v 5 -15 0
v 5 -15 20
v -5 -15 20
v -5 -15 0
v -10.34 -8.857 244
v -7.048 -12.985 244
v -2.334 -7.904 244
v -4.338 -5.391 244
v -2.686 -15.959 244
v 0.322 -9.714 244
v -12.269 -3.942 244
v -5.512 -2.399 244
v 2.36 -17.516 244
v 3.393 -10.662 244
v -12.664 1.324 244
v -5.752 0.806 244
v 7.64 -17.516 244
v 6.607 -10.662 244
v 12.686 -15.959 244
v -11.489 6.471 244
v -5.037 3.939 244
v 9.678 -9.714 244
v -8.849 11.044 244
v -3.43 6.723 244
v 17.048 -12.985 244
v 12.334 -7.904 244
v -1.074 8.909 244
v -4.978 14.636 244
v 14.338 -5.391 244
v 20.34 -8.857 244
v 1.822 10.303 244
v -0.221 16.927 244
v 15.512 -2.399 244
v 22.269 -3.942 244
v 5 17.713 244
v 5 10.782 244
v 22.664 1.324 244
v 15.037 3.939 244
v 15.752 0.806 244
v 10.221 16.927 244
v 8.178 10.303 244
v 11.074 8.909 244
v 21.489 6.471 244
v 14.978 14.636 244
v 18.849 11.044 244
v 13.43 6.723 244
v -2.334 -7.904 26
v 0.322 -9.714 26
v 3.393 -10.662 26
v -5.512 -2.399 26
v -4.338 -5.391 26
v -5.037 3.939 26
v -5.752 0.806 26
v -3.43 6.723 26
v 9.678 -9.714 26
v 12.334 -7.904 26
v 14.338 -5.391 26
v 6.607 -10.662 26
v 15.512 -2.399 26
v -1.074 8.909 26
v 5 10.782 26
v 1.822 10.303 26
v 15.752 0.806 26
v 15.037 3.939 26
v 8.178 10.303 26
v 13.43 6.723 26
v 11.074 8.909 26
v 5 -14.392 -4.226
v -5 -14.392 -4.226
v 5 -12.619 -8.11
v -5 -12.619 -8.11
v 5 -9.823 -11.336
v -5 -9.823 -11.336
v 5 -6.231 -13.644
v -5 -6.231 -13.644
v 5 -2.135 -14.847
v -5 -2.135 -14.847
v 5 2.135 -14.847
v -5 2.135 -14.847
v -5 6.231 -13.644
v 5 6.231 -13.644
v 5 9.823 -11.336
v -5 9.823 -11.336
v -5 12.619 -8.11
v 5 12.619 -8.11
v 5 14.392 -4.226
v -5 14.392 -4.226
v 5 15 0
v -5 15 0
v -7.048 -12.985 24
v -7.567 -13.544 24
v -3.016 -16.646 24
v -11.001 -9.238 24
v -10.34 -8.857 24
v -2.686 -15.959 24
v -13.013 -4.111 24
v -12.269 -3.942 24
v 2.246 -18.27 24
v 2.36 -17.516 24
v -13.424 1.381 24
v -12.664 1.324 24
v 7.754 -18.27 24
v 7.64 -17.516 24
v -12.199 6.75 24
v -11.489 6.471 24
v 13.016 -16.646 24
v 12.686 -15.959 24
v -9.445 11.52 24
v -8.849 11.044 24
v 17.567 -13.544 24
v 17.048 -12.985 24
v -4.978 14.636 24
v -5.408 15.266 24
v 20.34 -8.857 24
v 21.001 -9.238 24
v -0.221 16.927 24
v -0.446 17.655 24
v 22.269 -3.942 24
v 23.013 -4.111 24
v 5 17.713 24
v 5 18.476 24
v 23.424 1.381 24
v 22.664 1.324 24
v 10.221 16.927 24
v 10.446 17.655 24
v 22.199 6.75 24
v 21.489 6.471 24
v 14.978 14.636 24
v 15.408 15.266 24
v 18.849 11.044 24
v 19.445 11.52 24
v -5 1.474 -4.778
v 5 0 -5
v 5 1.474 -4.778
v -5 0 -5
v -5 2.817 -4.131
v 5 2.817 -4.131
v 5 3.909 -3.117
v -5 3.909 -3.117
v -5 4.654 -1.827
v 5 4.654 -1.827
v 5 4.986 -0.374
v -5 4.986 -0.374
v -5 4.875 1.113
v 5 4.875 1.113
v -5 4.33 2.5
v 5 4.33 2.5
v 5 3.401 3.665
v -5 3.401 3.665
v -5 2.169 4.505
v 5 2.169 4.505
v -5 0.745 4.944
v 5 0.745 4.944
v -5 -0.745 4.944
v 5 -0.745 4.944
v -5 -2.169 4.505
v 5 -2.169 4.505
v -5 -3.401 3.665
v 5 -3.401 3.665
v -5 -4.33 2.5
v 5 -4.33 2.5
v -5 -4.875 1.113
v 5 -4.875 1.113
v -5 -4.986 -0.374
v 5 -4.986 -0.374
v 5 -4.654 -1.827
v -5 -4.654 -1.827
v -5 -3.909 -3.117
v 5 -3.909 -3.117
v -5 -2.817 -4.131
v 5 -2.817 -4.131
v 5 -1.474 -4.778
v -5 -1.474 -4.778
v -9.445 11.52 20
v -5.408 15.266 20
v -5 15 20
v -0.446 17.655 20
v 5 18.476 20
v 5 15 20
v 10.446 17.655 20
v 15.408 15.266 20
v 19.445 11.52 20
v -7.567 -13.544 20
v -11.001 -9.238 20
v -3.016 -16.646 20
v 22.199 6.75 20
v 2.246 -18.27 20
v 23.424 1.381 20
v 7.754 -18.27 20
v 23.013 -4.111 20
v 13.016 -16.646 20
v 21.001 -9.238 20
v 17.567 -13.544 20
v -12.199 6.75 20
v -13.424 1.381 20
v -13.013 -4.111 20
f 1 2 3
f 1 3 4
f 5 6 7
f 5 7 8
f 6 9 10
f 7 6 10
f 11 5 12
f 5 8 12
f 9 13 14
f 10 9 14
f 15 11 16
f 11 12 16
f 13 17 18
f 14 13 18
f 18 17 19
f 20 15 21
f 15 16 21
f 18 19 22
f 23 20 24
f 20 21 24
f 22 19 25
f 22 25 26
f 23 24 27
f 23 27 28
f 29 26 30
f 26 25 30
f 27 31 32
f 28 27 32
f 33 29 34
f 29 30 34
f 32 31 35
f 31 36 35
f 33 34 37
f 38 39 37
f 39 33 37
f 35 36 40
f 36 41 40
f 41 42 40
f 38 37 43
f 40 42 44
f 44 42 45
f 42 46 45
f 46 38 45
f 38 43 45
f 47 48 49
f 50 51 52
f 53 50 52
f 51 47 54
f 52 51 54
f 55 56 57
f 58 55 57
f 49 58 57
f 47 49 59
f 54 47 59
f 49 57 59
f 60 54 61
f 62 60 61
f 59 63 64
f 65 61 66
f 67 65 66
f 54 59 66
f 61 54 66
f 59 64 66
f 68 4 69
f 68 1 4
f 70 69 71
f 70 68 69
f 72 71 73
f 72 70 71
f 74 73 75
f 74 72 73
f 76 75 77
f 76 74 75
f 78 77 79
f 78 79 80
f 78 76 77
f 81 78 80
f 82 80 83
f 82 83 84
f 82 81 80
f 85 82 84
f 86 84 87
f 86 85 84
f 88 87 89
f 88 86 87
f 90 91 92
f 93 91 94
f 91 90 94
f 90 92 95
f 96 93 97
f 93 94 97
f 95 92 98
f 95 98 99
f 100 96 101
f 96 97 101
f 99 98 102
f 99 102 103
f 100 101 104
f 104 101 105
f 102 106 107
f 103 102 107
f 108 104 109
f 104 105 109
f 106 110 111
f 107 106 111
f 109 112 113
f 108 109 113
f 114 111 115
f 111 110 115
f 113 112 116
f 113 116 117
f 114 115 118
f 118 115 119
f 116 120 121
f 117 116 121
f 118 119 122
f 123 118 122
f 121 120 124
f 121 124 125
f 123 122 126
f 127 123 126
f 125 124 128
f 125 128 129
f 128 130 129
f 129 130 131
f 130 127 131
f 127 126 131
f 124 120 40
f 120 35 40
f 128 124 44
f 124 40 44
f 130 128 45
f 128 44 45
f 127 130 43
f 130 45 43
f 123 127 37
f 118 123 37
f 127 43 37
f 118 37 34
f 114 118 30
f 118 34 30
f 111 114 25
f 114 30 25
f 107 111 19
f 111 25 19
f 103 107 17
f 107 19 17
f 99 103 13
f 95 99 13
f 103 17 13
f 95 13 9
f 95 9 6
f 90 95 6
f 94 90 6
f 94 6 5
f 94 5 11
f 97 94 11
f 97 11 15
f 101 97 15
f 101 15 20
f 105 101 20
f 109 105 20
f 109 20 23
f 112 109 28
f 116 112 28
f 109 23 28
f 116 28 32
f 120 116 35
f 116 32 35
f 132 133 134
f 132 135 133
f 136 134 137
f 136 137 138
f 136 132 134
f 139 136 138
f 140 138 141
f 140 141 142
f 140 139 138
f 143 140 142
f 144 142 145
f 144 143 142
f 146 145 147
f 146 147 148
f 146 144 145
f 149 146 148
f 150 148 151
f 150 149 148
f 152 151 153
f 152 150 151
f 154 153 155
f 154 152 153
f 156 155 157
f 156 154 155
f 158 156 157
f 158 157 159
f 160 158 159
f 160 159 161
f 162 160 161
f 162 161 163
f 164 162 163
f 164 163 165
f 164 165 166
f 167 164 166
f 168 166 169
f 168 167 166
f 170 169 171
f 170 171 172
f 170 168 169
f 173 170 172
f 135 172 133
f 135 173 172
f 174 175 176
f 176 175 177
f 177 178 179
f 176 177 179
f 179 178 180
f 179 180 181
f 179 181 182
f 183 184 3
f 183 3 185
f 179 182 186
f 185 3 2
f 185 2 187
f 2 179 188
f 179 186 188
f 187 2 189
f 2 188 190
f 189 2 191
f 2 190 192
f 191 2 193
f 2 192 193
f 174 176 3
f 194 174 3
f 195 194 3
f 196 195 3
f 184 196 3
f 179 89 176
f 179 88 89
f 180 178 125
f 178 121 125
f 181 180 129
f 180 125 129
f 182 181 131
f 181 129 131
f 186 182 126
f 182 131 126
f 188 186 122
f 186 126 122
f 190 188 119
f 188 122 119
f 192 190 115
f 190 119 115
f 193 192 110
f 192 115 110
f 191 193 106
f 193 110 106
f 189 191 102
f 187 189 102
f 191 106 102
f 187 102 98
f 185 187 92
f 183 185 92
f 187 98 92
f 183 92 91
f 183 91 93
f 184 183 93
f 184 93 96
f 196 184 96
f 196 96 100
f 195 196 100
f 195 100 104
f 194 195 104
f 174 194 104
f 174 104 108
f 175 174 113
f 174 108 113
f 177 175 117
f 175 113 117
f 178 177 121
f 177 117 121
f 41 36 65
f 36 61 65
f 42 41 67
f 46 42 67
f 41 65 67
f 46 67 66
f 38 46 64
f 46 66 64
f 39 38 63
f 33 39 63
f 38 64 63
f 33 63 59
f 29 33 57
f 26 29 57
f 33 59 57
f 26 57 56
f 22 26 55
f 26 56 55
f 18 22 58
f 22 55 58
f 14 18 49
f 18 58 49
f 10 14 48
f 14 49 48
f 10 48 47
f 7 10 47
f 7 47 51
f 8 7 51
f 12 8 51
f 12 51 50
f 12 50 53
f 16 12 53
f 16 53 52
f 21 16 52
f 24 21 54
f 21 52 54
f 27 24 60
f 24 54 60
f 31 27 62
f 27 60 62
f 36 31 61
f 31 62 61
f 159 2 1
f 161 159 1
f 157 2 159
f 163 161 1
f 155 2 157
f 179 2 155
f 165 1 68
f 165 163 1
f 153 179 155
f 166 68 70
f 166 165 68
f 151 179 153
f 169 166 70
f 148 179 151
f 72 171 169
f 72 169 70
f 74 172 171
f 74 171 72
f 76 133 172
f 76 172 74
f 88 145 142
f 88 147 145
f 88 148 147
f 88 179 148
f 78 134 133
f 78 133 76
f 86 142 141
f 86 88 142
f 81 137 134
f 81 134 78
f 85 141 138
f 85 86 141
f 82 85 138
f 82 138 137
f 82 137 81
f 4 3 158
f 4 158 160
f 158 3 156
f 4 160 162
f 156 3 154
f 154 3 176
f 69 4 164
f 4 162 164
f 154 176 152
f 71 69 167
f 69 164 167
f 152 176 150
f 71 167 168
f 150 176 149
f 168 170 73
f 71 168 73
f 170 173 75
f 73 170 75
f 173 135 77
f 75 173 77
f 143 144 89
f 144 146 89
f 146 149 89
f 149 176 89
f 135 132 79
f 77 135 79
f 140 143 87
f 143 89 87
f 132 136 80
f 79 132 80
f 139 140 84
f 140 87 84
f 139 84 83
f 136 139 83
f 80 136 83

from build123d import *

# Parameters (mm, degrees)
SKETCH1_R           = 5
BOSS_EXTRUDE1_DEPTH = 5


with BuildPart() as part:
    # Sketch1 → Boss-Extrude1 (new body, symmetric)
    with BuildSketch(Plane(origin=(0, 0, 0), x_dir=(0, 0, -1), z_dir=(1, 0, 0))):
        with BuildLine():
            Line((0, 15), (-20, 15))
            Line((-20, 15), (-20, -15))
            Line((-20, -15), (0, -15))
            ThreePointArc((0, -15), (15, 0), (0, 15))
        make_face()
        Circle(SKETCH1_R, mode=Mode.SUBTRACT)
    extrude(amount=BOSS_EXTRUDE1_DEPTH, both=True)

    # Sketch3 → Revolve1 (revolve)
    with BuildSketch(Plane(origin=(5, 0, 0), x_dir=(0, 0, -1), z_dir=(1, 0, 0))):
        Polygon((-20, 1.817002653), (-20, 15), (-20, 15.485698602), (-20, 18.475930921), (-24, 18.475930921), (-24, 17.713484144), (-244, 17.713484144), (-244, 10.782192935), (-26, 10.782192935), (-26, 0), (-20, 0), align=None)
    revolve(axis=Axis((5, 0, 26), (0, 0, -1)))


solid = part.part
